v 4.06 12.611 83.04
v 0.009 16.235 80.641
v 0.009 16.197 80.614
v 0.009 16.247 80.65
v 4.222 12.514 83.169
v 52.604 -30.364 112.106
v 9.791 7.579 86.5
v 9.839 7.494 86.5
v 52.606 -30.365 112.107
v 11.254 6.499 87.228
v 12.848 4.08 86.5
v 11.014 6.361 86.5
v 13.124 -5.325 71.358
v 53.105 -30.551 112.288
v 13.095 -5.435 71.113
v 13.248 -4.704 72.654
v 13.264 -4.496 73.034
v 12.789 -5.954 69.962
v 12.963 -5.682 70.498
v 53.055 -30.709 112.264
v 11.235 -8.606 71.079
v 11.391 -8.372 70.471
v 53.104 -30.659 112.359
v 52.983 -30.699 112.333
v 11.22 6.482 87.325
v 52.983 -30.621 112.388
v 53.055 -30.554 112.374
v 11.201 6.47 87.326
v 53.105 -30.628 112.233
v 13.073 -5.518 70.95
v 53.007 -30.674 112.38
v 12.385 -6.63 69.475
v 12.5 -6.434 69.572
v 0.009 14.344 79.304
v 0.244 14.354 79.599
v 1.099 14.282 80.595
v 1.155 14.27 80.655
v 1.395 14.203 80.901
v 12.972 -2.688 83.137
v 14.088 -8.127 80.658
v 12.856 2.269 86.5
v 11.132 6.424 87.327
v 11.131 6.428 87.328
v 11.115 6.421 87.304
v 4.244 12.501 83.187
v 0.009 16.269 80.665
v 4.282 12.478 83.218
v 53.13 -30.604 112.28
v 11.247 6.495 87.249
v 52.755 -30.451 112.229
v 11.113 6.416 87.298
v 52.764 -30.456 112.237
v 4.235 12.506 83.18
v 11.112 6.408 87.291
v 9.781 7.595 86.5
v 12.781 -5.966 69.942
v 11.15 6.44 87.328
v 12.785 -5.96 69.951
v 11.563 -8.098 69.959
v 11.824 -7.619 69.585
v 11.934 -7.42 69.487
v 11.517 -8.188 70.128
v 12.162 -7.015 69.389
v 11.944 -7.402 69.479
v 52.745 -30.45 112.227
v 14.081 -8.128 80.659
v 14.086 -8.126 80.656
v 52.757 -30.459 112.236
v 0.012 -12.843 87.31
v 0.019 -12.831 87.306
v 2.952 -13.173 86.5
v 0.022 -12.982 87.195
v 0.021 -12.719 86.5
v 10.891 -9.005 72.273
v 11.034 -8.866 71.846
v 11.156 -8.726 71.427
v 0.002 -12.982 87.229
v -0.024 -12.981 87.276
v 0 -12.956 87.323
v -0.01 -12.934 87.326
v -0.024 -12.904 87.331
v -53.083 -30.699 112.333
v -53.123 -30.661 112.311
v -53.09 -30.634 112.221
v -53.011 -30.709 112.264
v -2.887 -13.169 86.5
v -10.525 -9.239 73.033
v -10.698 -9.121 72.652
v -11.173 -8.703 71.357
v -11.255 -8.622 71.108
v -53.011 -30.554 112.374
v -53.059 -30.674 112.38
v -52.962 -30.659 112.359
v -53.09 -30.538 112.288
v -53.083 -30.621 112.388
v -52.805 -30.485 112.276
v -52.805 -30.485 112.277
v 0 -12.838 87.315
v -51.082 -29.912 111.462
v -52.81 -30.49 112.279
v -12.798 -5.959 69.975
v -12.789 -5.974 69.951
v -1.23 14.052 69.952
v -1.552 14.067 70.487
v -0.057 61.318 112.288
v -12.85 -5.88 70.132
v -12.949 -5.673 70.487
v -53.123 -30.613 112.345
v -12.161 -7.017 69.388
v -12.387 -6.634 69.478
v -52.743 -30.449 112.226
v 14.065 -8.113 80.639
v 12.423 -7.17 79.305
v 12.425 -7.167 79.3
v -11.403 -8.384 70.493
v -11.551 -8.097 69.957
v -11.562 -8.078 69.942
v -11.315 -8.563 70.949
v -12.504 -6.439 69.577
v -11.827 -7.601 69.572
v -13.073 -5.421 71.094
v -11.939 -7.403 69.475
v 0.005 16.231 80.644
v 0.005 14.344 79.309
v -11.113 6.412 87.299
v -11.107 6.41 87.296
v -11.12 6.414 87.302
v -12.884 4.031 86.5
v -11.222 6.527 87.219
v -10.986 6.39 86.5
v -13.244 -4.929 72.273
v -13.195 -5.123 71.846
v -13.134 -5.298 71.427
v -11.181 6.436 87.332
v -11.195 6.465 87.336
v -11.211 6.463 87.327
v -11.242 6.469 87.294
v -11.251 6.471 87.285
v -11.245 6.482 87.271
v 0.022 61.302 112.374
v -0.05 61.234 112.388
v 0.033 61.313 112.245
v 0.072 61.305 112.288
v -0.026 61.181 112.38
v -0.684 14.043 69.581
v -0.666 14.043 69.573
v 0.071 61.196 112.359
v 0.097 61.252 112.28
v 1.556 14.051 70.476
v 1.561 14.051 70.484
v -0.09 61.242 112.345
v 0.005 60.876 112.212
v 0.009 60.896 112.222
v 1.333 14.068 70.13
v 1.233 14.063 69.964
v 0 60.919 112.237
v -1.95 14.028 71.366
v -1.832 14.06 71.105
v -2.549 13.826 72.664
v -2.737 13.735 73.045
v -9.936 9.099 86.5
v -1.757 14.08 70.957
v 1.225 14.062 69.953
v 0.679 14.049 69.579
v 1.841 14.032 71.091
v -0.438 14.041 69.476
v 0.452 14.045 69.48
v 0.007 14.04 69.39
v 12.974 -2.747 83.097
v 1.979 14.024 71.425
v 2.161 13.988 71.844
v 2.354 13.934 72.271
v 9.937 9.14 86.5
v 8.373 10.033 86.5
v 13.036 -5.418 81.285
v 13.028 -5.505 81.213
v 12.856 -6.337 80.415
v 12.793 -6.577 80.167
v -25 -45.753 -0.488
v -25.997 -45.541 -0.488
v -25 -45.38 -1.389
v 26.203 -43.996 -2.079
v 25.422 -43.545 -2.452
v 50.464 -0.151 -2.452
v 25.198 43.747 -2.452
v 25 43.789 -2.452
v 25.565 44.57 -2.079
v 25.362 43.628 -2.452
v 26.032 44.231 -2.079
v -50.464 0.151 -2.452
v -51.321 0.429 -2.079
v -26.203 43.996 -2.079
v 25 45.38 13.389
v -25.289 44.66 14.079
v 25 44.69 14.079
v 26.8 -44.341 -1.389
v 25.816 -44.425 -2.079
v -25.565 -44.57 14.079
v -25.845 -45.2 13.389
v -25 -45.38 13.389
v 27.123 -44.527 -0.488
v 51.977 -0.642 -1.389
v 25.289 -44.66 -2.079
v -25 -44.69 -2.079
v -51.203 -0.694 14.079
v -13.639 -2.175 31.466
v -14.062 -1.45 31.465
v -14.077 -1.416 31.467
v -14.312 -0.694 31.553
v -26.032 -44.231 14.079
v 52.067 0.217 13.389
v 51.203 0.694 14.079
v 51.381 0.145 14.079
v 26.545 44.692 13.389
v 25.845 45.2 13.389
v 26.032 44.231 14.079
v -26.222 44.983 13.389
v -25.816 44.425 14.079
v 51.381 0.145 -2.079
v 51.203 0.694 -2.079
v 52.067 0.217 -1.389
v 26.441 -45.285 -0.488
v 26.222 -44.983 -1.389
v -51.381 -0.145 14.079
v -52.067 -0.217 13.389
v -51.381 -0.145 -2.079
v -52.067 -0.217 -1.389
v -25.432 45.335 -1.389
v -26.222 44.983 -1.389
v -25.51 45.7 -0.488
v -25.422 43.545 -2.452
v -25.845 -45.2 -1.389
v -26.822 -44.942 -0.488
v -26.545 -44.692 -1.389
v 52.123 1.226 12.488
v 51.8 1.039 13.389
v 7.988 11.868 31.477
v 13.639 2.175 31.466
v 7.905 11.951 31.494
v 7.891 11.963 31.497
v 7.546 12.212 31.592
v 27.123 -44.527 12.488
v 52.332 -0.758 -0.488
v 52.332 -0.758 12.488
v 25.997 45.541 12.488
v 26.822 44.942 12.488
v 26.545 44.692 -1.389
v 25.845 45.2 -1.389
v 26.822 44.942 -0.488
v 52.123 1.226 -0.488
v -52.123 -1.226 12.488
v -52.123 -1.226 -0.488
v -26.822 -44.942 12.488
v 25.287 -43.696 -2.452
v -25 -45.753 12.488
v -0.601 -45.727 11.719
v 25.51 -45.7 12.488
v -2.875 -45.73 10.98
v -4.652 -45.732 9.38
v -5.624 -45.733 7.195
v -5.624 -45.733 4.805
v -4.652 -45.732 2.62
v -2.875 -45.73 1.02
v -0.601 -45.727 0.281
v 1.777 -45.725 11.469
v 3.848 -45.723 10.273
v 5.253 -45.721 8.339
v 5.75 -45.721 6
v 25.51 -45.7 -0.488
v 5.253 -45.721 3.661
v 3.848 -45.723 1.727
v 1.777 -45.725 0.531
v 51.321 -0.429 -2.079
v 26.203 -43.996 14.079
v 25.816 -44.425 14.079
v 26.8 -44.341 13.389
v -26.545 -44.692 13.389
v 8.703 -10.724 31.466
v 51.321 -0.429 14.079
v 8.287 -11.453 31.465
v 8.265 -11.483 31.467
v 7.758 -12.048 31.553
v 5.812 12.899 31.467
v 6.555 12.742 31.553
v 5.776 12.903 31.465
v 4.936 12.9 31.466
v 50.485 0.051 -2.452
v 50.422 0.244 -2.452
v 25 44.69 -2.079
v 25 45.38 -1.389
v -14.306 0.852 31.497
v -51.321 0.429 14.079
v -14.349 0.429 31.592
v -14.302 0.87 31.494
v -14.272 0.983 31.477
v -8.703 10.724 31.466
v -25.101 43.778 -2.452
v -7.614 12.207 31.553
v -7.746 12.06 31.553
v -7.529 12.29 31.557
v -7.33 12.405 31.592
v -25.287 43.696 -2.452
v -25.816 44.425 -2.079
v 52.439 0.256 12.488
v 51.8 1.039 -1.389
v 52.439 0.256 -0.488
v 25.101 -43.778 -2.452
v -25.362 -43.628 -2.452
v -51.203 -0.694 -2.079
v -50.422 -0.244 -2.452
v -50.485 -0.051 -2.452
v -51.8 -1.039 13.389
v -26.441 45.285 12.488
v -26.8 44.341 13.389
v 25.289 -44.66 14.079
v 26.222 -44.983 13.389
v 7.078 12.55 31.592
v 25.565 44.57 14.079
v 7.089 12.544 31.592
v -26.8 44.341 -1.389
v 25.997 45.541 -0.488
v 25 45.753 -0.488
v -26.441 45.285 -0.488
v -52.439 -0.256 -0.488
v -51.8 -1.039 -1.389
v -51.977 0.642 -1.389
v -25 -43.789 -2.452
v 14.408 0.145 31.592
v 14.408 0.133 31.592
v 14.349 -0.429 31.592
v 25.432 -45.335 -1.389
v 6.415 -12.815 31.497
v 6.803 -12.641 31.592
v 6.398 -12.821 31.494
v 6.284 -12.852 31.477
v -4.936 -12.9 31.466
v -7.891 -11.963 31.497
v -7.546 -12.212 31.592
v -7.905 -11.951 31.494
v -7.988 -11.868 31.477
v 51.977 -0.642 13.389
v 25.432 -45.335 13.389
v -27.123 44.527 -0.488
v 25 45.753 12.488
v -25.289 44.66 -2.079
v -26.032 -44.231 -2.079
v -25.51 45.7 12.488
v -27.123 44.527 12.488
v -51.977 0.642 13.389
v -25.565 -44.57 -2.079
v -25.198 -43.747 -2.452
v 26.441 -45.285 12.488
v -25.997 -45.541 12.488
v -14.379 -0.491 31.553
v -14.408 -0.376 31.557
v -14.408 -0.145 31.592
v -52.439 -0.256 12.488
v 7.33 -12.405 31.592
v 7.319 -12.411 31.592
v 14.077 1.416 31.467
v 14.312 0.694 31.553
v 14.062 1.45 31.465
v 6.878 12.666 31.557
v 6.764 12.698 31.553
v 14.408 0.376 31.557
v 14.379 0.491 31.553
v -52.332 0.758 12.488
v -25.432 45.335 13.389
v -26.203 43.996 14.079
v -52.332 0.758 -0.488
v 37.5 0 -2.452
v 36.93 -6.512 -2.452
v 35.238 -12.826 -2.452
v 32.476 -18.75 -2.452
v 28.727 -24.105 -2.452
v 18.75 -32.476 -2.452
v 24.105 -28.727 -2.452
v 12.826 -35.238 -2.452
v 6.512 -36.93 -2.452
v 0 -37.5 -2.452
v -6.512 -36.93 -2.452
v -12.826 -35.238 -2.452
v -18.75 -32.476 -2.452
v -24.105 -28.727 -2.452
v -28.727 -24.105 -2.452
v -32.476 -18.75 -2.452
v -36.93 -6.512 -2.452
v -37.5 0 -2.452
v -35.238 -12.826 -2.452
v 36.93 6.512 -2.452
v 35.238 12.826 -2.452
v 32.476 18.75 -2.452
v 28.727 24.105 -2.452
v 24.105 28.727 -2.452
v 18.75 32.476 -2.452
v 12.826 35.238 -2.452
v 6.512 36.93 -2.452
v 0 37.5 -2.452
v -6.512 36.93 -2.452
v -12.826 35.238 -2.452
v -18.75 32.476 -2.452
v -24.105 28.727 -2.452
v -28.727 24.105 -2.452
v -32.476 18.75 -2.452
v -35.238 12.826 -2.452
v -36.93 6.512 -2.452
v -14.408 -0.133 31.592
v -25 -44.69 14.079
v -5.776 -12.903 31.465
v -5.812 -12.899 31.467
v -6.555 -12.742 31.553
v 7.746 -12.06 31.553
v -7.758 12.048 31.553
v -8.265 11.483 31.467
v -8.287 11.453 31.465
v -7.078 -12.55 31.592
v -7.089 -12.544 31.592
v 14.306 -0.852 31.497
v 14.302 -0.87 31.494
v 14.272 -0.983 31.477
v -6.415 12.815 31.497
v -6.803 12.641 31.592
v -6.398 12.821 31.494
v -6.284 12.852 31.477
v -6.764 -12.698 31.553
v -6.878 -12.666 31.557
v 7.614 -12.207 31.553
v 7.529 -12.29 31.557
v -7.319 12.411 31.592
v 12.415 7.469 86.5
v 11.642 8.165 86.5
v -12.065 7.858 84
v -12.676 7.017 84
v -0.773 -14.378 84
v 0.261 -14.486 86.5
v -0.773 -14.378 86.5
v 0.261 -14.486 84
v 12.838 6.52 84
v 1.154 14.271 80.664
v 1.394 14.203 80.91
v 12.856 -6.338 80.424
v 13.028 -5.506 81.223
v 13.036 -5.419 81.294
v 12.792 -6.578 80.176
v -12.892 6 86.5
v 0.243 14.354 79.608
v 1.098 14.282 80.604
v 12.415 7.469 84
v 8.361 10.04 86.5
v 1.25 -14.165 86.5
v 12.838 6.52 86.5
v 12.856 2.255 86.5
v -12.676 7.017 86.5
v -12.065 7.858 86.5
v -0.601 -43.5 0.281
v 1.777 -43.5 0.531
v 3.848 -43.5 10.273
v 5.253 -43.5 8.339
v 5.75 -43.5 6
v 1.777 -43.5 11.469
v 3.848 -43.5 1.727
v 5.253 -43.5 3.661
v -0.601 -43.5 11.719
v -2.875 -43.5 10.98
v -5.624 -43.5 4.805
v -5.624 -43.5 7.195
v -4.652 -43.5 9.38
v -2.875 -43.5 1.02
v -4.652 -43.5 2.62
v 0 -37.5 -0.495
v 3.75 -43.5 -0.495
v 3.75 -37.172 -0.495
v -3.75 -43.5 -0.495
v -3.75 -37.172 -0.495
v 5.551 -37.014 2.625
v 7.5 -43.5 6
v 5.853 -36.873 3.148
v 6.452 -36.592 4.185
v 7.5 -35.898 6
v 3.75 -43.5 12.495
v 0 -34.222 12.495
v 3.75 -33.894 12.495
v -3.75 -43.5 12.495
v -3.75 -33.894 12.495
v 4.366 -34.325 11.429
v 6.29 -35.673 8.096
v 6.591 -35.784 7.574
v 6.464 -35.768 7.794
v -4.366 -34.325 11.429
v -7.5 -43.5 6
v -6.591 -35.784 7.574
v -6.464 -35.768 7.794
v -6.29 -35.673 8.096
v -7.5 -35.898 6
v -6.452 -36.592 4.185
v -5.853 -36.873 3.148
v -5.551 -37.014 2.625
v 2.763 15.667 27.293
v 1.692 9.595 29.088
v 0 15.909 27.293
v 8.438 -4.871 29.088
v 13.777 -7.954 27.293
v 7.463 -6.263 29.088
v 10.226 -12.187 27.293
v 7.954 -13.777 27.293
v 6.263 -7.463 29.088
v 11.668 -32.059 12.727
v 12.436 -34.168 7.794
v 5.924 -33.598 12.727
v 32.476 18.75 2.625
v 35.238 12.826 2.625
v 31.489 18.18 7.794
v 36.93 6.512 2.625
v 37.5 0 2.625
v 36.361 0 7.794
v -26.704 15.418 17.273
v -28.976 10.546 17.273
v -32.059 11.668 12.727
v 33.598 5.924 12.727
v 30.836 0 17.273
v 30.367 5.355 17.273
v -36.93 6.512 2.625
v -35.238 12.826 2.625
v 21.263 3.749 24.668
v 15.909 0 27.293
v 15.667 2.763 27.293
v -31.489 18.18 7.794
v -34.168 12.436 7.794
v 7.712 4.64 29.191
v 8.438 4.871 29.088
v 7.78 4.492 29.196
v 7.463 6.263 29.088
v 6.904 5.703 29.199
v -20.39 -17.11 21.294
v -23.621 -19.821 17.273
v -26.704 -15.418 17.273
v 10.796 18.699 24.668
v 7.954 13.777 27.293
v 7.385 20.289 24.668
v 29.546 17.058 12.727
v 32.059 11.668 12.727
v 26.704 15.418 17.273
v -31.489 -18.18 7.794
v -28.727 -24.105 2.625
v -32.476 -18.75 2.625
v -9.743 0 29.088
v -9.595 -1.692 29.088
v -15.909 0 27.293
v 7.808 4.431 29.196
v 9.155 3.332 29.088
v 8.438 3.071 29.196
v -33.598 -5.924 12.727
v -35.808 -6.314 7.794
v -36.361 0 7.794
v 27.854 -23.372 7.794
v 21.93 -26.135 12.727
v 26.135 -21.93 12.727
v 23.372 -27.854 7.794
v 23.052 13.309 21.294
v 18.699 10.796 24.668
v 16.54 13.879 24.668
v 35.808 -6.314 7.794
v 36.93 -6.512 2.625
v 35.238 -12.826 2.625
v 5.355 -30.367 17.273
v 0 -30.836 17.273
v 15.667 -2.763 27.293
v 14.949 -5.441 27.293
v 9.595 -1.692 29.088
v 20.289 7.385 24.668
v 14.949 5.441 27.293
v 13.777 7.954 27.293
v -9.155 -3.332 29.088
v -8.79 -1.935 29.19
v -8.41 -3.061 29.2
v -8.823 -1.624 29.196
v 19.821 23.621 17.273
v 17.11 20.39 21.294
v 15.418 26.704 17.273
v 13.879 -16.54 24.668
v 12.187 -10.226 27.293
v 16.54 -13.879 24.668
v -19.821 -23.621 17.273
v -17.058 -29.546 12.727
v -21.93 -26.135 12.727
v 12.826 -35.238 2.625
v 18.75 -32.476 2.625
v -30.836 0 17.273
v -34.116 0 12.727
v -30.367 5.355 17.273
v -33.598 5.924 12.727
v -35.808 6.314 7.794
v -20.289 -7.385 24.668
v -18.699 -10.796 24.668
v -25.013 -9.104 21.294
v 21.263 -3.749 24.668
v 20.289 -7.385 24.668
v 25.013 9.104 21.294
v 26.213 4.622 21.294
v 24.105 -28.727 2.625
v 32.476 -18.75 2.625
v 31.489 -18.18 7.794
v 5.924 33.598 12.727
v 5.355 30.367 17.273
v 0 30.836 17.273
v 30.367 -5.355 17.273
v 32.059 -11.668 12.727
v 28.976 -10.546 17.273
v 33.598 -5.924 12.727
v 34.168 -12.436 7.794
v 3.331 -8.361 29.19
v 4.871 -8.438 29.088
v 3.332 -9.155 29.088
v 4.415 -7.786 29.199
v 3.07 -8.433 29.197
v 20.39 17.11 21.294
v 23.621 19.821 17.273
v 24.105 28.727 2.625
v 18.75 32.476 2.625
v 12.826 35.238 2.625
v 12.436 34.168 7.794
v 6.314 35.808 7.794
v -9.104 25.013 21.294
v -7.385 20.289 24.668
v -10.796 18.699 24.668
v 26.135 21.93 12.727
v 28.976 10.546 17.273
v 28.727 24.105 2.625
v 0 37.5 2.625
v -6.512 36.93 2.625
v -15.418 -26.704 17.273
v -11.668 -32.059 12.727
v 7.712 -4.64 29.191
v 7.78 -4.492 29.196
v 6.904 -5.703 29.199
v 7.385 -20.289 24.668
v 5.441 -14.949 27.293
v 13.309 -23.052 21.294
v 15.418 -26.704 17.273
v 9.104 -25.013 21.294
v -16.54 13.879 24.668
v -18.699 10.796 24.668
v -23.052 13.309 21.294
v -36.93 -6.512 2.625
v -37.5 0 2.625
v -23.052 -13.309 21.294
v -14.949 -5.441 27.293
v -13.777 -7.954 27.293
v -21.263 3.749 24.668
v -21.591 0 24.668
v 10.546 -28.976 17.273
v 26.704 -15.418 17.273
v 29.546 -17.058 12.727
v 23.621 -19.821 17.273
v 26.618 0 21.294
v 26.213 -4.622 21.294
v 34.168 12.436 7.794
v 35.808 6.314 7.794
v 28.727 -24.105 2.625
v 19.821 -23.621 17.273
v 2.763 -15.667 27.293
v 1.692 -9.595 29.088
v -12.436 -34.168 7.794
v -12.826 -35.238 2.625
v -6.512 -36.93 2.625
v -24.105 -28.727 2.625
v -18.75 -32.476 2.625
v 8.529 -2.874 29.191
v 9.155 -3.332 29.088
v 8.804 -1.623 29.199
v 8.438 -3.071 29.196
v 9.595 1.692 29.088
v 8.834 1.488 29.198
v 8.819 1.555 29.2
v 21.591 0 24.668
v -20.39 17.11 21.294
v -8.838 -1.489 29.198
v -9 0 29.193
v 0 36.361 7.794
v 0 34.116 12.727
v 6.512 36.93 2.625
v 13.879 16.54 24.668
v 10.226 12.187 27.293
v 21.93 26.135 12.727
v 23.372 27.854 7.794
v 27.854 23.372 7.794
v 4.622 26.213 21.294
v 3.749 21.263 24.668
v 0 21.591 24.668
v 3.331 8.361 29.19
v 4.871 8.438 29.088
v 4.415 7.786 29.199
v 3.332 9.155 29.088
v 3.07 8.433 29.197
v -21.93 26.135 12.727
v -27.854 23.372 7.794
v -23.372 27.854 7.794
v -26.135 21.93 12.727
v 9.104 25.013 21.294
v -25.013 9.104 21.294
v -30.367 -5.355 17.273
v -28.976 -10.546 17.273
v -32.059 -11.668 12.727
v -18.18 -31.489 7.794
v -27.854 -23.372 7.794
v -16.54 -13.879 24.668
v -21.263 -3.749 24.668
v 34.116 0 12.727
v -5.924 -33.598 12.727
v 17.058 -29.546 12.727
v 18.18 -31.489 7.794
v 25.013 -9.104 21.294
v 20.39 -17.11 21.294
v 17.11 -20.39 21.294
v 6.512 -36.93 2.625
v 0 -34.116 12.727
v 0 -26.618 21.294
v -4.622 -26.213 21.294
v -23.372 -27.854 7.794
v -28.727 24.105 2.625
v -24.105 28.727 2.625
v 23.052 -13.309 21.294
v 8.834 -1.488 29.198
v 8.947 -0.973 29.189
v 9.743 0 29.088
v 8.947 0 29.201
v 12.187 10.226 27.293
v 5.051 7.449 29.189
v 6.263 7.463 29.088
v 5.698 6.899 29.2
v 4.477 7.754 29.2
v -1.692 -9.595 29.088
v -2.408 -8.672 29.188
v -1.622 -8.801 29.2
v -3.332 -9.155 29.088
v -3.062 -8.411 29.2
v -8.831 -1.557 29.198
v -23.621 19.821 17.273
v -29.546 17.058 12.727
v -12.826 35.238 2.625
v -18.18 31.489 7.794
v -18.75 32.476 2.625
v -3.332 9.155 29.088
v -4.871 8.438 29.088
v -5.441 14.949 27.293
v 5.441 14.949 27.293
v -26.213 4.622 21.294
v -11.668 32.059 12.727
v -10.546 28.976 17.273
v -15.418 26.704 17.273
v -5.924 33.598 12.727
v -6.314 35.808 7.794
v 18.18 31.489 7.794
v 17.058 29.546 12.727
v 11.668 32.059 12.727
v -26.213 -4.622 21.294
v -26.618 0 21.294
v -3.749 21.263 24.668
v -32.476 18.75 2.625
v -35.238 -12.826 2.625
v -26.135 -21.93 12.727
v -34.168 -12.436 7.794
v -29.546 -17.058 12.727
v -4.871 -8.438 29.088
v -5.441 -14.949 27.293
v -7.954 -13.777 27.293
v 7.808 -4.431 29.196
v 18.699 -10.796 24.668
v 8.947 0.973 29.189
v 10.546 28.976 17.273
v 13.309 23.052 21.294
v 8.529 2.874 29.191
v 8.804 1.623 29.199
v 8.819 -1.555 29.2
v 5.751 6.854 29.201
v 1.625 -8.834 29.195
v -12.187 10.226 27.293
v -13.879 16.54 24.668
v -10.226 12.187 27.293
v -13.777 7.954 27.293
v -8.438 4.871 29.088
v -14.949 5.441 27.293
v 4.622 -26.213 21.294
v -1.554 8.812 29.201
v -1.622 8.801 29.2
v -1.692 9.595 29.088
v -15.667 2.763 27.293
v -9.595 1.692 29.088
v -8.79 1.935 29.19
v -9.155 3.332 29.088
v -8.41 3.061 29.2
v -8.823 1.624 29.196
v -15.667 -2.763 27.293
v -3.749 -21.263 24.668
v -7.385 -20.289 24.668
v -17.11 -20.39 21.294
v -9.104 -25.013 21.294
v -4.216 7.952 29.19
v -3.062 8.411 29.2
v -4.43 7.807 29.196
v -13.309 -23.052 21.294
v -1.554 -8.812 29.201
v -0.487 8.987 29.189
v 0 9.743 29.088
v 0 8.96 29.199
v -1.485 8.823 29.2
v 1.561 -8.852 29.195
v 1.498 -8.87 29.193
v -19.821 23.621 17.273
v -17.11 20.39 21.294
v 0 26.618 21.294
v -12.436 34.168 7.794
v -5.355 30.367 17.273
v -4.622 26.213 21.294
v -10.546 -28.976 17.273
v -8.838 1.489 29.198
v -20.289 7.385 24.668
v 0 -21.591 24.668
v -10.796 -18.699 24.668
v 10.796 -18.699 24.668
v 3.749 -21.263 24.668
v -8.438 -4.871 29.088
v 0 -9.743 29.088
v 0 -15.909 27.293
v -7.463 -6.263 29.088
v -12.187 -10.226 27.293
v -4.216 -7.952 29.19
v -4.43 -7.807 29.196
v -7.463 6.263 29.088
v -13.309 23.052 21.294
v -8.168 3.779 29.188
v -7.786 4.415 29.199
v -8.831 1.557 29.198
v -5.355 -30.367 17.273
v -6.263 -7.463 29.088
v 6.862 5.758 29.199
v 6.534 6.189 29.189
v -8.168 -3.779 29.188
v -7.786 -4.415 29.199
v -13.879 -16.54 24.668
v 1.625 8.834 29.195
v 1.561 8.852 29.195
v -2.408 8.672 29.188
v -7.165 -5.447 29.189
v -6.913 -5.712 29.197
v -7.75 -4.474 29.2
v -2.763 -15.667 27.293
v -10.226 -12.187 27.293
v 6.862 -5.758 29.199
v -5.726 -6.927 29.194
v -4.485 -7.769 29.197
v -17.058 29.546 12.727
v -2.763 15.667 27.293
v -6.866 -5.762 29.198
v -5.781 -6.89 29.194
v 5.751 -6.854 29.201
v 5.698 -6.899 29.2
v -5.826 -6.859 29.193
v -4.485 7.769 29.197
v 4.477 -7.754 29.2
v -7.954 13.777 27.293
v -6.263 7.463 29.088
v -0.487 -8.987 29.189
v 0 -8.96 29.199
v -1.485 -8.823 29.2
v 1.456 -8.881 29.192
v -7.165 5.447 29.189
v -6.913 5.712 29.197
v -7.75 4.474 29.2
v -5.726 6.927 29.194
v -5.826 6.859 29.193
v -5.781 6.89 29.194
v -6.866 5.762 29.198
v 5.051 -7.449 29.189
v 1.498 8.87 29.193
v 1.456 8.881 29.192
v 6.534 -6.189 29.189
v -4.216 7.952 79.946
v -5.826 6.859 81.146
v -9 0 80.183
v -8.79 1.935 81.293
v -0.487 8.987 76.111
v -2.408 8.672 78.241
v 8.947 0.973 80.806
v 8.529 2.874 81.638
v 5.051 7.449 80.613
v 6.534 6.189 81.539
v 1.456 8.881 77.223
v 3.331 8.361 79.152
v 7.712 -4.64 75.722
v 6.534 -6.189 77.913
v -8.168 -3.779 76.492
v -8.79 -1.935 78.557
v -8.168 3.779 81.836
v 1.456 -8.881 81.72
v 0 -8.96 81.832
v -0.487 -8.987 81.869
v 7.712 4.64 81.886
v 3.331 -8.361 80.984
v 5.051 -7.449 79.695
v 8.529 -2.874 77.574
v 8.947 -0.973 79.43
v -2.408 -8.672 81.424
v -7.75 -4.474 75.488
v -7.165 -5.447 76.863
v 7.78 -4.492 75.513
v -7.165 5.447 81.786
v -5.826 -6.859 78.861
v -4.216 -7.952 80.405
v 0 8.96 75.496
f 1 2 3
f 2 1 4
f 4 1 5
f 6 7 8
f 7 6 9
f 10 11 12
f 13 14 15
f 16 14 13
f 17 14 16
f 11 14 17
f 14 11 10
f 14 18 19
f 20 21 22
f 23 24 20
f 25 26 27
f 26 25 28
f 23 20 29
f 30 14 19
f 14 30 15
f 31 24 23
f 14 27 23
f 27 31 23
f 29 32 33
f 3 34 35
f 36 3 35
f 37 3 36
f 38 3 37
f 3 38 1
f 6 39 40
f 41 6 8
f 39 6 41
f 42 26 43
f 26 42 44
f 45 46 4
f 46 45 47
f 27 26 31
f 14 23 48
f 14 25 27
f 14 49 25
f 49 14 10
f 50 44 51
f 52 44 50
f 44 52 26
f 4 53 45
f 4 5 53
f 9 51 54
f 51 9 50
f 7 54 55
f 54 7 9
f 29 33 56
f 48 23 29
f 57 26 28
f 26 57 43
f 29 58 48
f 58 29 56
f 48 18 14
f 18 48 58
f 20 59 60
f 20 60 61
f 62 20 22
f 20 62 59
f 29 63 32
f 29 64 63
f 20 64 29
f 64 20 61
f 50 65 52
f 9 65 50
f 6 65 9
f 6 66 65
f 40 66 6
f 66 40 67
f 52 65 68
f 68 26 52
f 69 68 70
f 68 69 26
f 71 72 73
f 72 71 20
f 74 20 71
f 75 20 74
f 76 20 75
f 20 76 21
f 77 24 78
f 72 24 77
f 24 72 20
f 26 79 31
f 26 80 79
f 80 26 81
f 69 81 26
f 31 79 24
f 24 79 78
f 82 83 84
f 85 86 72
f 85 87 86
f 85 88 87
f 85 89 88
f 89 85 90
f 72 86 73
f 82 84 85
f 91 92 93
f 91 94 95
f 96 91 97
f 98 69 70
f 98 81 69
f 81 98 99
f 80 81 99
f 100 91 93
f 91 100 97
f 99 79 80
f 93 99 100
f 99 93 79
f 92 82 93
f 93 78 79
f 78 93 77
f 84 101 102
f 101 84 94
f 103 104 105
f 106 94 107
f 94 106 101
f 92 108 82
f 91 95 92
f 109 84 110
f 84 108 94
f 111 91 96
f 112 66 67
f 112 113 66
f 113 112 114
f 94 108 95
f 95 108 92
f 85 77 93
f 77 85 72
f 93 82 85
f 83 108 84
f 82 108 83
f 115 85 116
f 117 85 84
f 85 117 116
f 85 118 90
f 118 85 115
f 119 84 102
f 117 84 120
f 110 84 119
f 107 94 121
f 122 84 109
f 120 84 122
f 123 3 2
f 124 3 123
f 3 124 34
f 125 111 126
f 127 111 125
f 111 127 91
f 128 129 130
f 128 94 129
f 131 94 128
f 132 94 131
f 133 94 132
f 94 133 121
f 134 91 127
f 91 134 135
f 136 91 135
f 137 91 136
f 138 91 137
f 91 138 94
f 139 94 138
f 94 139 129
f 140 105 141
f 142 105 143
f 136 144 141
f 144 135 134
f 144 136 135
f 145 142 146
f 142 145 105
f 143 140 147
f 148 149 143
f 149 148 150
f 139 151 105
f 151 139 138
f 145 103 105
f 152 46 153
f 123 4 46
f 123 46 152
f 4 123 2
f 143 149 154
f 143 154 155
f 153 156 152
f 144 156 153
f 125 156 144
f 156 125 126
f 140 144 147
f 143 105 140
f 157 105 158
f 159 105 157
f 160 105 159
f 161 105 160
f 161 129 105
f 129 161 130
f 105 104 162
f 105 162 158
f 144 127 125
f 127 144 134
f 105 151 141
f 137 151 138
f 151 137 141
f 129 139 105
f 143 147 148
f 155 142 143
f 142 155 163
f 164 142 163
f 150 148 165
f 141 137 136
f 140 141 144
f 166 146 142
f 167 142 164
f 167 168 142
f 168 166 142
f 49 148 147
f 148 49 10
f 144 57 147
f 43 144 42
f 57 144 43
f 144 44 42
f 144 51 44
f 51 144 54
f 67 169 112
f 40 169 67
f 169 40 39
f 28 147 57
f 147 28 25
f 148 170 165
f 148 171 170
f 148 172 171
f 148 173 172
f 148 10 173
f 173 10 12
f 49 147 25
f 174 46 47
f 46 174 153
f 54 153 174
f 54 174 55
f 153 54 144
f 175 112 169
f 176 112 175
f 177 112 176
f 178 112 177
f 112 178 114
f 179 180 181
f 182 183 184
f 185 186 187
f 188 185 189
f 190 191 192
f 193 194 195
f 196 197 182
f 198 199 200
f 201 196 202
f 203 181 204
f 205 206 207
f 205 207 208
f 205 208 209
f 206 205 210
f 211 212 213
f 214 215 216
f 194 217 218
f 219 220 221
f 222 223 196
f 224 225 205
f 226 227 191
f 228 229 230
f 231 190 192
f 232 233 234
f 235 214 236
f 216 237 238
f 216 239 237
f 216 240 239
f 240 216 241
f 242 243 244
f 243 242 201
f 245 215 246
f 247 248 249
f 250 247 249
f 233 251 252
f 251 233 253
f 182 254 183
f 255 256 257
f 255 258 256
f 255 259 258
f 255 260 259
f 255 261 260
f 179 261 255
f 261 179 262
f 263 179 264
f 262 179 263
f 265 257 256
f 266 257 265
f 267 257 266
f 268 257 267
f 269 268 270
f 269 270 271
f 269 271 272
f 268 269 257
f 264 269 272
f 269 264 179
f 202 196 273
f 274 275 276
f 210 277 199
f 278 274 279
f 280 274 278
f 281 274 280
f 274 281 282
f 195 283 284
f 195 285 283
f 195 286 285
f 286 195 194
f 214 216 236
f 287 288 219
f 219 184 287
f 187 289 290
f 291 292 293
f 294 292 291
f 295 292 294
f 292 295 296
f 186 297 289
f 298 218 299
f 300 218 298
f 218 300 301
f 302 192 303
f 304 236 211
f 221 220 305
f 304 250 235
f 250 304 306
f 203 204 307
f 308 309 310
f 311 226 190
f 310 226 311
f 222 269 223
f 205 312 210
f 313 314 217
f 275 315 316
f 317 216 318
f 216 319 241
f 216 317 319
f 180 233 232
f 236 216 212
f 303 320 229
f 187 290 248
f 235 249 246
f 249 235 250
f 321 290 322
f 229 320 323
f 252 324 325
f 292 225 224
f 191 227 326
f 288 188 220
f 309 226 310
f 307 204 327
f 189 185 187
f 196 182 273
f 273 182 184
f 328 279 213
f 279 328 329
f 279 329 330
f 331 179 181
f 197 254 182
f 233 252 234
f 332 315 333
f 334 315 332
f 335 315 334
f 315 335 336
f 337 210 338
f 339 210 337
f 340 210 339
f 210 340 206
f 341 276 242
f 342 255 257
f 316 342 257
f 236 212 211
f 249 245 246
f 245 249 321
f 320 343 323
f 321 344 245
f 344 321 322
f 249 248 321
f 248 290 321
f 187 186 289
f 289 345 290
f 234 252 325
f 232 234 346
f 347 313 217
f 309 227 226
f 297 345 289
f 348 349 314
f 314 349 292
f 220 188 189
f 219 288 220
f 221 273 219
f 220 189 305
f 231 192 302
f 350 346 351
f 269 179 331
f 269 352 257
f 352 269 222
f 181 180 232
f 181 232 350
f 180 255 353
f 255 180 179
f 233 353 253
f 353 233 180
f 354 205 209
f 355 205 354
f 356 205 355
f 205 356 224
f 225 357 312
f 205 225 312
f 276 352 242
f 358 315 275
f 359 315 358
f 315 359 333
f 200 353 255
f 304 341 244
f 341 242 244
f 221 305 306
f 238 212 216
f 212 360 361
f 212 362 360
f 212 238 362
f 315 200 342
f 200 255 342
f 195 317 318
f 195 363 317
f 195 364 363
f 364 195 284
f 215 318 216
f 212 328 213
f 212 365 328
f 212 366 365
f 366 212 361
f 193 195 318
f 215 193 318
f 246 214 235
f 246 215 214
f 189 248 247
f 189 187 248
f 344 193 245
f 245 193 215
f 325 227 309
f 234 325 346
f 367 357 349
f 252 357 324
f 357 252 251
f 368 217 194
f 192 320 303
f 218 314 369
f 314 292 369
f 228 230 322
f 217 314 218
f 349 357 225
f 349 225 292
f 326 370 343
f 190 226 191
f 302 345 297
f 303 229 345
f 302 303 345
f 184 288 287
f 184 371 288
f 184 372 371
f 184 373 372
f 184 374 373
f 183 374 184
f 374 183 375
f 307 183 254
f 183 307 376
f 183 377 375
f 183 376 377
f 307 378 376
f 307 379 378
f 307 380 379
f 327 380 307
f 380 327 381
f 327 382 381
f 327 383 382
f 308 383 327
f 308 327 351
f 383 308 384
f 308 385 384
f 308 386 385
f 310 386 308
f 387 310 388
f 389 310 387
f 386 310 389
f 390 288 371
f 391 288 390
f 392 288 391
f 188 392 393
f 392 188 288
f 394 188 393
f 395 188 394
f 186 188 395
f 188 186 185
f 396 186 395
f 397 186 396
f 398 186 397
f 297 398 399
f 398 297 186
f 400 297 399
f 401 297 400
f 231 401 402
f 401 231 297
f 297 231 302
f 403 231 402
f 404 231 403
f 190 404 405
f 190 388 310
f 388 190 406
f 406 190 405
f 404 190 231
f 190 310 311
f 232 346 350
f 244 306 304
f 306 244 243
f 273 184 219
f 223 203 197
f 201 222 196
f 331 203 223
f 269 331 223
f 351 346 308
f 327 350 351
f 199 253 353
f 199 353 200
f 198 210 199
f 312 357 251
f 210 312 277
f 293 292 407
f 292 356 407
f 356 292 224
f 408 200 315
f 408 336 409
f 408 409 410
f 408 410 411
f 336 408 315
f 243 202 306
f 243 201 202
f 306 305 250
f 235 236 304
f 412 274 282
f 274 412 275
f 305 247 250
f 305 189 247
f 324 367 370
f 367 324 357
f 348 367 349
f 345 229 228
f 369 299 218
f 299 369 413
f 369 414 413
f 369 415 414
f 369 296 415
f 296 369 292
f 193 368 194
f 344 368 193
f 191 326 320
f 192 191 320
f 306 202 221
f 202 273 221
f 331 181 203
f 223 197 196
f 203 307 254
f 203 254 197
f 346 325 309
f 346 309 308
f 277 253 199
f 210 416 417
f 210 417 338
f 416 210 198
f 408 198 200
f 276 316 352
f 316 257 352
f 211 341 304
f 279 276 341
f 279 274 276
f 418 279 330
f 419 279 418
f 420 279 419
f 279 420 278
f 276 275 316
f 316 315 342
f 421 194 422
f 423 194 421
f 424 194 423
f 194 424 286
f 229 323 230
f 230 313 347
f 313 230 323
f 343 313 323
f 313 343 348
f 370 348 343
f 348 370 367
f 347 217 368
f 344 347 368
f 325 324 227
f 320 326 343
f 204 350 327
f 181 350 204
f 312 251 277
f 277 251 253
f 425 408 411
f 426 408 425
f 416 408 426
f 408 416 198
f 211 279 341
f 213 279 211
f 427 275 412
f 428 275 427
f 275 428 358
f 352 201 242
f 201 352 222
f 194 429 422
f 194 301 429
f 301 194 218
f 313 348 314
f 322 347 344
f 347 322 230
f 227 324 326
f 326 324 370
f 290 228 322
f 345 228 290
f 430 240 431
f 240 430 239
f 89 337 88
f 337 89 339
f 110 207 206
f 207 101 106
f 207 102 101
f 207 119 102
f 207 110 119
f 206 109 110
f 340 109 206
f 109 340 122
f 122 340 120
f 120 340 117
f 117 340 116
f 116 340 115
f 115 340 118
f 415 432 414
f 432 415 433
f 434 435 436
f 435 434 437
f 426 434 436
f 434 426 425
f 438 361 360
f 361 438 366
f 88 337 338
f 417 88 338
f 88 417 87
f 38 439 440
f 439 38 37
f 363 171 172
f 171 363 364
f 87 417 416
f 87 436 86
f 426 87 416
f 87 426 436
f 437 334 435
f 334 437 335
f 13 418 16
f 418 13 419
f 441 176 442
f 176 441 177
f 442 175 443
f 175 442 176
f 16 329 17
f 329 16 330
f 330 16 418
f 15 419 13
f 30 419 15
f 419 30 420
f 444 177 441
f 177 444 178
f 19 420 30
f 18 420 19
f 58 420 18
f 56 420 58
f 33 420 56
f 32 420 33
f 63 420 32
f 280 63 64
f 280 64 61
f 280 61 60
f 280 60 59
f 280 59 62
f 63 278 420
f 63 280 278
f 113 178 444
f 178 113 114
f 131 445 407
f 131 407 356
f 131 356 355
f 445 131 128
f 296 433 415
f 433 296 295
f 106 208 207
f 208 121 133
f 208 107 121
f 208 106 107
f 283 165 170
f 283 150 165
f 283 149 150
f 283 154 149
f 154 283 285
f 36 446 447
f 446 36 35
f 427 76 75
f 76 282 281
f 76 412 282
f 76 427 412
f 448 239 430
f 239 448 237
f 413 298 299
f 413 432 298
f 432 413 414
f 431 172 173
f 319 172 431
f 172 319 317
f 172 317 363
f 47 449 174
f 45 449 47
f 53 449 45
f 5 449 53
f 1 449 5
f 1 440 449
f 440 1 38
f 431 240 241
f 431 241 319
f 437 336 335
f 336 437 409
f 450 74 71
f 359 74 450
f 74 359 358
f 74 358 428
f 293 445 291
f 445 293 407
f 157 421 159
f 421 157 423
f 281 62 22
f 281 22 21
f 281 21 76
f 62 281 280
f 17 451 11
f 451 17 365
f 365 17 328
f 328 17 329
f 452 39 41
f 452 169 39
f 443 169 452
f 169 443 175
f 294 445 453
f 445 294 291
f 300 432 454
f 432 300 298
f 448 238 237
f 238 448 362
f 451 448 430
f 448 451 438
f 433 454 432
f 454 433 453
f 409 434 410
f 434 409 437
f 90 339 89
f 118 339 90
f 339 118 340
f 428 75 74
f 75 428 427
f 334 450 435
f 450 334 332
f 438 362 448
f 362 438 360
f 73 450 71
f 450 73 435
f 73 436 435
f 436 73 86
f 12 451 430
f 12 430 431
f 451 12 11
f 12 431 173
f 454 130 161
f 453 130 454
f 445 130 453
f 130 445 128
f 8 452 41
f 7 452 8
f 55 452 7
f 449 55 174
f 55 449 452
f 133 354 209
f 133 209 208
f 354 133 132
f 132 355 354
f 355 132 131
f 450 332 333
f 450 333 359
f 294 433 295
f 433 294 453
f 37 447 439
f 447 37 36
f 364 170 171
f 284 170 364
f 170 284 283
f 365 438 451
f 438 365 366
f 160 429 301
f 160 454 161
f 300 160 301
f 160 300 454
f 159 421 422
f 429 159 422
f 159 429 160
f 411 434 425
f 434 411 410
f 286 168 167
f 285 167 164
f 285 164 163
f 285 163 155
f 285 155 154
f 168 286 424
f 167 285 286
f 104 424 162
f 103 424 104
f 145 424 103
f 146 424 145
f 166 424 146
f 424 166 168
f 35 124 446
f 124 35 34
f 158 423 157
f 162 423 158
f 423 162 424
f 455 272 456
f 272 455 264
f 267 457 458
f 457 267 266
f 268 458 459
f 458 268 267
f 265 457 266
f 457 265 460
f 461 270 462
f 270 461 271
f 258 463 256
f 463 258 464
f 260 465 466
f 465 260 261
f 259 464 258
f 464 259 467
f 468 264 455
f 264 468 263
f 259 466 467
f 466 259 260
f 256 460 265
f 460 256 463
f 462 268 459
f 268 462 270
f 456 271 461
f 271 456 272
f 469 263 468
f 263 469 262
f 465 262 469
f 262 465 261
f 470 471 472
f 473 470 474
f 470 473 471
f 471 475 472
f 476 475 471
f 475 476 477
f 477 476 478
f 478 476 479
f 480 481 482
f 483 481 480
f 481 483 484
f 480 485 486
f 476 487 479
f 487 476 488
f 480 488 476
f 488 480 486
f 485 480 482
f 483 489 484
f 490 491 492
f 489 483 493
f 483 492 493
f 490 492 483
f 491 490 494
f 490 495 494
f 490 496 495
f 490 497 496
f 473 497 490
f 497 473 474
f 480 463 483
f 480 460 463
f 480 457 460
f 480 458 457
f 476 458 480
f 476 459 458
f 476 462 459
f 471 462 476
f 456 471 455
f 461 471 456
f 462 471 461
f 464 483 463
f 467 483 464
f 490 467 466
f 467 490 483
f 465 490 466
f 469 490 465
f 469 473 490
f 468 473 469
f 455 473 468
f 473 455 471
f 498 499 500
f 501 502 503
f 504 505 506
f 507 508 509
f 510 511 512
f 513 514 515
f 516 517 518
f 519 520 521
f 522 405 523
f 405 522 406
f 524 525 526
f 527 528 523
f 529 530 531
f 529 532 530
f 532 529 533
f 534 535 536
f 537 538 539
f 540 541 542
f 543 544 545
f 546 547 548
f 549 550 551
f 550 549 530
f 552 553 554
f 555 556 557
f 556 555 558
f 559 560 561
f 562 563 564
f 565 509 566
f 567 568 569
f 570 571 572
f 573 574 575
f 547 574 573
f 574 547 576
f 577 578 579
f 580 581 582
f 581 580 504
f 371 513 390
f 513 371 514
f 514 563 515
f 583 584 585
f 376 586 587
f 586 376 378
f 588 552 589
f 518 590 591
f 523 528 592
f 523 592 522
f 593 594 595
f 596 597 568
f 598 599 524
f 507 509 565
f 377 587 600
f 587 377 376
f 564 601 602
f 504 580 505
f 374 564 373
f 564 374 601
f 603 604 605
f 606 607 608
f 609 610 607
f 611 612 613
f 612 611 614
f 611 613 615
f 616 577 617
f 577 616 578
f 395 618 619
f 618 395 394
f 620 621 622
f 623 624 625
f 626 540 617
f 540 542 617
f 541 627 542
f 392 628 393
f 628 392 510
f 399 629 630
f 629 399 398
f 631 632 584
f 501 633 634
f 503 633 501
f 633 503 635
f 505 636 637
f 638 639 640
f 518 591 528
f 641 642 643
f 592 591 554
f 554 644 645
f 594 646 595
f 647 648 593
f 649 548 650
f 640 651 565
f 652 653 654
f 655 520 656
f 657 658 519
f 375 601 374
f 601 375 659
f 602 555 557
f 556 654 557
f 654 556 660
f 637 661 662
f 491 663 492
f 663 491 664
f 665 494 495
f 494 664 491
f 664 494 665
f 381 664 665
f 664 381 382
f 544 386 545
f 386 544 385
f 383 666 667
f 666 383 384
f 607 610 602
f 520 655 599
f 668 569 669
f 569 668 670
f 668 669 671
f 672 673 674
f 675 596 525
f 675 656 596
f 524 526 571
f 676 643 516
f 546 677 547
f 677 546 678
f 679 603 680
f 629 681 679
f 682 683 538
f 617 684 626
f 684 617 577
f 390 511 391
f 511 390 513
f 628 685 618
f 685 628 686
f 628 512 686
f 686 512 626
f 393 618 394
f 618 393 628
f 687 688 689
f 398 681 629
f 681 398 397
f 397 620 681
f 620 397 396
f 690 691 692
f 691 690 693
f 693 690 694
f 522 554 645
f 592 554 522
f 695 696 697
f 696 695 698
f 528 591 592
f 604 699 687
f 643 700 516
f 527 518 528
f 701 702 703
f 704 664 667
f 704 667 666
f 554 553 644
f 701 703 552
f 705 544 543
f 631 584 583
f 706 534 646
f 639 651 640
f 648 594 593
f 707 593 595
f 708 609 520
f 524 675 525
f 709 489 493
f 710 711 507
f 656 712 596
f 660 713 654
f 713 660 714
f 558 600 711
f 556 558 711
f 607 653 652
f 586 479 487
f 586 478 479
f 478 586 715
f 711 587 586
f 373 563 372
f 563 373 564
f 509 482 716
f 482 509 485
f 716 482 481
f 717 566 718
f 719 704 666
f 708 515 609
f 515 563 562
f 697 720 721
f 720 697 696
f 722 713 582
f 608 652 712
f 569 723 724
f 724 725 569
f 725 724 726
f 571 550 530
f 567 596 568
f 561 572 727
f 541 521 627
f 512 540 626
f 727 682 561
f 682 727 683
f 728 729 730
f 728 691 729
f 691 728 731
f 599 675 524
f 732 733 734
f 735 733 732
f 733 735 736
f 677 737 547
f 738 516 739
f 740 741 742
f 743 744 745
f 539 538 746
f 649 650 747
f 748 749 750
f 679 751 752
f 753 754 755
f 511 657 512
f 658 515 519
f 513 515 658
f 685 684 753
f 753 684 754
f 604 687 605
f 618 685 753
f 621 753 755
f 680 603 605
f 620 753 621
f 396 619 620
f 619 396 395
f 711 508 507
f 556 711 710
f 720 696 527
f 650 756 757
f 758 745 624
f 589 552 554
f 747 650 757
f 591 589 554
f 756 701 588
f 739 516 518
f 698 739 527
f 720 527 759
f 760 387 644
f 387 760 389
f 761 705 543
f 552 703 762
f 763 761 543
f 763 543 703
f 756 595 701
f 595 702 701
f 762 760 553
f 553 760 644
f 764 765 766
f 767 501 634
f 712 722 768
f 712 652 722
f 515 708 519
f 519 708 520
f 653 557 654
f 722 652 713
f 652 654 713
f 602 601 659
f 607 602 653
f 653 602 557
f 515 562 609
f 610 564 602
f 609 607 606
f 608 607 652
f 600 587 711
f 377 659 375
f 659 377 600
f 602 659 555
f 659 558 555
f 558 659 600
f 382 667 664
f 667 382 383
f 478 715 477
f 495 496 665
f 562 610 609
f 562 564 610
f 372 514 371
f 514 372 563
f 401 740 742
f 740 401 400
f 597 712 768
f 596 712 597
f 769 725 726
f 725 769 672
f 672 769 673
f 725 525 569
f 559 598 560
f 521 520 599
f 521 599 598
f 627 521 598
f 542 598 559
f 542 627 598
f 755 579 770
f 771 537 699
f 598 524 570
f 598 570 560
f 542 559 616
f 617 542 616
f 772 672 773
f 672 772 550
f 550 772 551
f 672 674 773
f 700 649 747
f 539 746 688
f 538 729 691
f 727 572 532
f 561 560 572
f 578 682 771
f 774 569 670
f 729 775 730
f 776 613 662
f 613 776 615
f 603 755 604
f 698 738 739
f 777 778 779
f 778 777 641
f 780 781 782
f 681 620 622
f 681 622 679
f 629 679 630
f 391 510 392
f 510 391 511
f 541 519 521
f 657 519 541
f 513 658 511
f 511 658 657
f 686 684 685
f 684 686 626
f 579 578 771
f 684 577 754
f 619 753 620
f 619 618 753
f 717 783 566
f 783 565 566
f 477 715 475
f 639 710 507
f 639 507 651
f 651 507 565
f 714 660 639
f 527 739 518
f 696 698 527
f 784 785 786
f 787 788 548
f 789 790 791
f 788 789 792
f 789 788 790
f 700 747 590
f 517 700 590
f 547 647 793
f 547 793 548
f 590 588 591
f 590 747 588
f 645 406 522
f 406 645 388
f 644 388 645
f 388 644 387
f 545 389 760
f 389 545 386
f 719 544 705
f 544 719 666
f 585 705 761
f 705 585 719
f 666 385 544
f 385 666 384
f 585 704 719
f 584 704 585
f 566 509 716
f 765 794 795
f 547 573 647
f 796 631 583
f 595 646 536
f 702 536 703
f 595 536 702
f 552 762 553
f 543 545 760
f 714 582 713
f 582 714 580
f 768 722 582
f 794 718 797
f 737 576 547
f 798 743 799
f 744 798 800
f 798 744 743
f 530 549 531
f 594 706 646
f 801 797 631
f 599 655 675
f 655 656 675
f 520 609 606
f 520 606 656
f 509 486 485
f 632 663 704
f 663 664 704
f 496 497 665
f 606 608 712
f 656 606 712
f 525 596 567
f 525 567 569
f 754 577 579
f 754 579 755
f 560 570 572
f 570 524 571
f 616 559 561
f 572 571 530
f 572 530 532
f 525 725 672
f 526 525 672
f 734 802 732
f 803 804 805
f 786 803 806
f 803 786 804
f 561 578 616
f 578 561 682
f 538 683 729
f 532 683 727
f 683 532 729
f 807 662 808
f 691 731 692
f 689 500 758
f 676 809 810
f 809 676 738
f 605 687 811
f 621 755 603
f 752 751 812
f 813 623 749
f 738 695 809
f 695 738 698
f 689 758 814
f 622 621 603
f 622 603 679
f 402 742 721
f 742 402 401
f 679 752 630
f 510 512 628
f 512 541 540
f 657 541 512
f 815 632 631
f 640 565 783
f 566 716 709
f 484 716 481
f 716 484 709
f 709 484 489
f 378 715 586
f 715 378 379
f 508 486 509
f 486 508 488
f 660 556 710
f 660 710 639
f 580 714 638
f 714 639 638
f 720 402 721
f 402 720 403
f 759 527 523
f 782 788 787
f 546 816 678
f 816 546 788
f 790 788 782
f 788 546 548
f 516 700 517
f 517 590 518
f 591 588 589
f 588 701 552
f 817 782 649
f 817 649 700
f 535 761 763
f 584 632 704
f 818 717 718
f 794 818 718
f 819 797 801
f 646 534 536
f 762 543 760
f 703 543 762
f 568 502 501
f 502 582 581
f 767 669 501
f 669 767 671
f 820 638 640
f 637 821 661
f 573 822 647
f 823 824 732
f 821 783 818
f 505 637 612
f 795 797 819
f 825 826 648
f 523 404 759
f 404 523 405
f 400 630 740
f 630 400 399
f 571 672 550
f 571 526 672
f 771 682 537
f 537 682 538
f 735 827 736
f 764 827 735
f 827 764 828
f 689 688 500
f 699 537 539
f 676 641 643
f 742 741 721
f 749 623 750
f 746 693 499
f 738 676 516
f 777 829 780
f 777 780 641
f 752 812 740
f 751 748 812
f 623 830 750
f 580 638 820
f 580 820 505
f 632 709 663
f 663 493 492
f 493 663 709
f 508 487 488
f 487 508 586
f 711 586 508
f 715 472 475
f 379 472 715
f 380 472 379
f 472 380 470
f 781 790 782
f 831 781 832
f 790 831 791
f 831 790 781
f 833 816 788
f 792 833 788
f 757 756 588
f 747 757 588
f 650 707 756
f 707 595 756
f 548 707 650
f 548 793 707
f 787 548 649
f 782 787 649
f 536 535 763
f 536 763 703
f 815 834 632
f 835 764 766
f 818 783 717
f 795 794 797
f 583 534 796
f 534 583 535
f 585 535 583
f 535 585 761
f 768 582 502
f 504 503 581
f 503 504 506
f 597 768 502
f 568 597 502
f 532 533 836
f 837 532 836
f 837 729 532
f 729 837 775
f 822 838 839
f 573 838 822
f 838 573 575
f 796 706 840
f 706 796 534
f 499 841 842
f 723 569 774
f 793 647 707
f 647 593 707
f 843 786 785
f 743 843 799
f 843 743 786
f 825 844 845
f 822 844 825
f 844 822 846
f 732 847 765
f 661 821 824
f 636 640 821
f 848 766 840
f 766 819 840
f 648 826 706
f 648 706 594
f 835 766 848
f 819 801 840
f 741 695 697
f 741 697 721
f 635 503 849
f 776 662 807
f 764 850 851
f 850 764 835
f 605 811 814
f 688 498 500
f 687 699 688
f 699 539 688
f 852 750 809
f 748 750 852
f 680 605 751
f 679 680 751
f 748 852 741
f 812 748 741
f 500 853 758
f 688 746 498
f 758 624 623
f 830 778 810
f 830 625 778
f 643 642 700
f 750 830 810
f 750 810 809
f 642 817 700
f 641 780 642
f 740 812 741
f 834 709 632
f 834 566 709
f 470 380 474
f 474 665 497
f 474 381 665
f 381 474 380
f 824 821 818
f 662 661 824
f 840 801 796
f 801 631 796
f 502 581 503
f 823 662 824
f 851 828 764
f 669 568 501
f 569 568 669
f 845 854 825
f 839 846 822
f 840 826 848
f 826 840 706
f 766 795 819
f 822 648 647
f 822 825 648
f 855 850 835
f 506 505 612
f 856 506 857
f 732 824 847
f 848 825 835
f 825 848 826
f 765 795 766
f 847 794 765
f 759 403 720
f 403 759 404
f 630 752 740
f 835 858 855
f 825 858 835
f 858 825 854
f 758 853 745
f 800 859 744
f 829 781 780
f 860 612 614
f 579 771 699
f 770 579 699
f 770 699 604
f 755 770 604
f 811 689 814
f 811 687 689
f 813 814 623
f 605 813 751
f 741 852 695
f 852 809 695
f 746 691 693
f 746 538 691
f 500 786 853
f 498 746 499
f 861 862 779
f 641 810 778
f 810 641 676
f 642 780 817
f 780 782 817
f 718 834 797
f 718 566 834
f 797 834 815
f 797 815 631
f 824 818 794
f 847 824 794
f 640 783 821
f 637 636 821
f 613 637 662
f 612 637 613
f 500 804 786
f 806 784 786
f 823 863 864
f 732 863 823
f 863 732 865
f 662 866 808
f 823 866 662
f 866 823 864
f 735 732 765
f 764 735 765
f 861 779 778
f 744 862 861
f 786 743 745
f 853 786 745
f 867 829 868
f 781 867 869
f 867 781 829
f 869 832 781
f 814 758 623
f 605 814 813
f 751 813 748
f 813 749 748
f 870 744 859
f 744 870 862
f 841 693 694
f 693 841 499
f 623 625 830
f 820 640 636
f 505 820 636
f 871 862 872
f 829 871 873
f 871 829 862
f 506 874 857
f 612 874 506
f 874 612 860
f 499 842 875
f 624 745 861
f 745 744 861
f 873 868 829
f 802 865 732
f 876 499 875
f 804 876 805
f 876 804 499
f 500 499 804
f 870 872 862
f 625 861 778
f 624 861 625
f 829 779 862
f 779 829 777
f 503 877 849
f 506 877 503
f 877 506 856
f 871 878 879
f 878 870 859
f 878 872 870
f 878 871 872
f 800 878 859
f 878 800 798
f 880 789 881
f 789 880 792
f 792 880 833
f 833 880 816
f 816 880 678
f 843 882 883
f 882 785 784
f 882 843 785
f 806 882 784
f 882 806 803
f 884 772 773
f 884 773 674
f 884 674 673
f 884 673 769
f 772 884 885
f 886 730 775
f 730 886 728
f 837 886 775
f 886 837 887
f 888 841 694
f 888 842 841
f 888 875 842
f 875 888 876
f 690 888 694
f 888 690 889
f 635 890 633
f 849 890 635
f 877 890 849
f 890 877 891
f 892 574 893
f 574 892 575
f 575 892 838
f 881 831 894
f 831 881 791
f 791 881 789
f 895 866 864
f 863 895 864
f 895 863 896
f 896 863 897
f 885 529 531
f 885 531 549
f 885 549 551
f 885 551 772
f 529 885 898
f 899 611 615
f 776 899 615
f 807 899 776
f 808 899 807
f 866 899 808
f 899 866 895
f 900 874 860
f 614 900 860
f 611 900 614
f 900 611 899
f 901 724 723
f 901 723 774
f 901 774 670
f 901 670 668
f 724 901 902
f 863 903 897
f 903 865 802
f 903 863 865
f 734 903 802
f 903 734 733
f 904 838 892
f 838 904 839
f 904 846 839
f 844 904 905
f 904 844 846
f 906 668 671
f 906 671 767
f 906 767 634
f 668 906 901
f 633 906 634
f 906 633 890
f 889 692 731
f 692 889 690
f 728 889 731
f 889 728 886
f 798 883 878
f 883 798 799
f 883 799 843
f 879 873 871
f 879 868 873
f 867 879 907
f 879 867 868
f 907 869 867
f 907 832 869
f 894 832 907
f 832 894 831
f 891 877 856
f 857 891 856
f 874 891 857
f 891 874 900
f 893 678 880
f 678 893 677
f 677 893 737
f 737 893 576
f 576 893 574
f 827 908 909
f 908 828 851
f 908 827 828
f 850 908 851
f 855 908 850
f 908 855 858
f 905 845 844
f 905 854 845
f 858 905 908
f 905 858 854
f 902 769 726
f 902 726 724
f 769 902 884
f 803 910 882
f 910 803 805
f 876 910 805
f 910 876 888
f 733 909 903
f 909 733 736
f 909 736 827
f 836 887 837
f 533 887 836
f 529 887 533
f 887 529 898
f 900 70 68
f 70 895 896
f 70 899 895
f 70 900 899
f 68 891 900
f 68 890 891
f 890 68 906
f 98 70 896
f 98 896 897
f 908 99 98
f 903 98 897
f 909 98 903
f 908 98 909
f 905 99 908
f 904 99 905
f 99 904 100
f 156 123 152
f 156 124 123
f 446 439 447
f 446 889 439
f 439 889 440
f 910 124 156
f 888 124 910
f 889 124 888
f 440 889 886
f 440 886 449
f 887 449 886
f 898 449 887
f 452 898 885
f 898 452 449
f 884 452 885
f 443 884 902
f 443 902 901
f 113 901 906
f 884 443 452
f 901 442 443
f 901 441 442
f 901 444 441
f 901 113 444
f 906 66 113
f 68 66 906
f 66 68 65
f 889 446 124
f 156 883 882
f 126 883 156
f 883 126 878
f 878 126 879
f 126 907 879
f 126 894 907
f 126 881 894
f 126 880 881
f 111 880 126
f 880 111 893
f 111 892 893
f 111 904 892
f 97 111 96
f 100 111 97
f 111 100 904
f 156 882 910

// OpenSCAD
cubeHeigth = 20;
socketRadius=50;

socketCube();

module cubeCorner() {
    cornerHull(socketRadius*1.5, 0,                cubeHeigth,       0);
    cornerHull(socketRadius*1.5, 0,                0,                cubeHeigth);
    cornerHull(cubeHeigth,       0,                0,                socketRadius*1.5);
    cornerHull(0,                cubeHeigth,       0,                socketRadius*1.5);
    cornerHull(0,                socketRadius*1.5, 0,                cubeHeigth);
    cornerHull(cubeHeigth,       0,                socketRadius*1.5, 0);
}

module cornerHull(a, b, e, f) {
    hull() {
        translate([0,0,6*12-3]) rotate([45,-atan(sqrt(0.5)),0]) {
            translate([0,0,0]) sphere(0.1);
            translate([a,b,0]) sphere(0.1);
            translate([0,e,f]) sphere(0.1);
        }
        rotate([0,0,0]) translate([0,0,5*12]) sphere(d=5,$fn=15);
    }
}

module socketCube() { 
    difference() {
        union() {
            rotate([0,0,-30]) cubeCorner();
            hull() {
                for (i=[0:6]) {
                    rotate([0,0,i*60+30]) translate([0,socketRadius,0]) sphere(d=5,$fn=15);
                    rotate([0,0,i*60+30]) translate([0,socketRadius,12]) sphere(d=5,$fn=15);
                    rotate([0,0,i*60+30]) translate([0,12,2.5*12]) sphere(d=5,$fn=15);
                }
            }   
            hull() {
                for (i=[0:6]) {
                    rotate([0,0,i*60+30]) translate([0,12,2.5*12]) sphere(d=5,$fn=15);
                    rotate([0,0,i*60]) translate([0,12,7*12]) cylinder(d=5, h=2.5,$fn=15);
                }
            }  
        }
        resize([socketRadius*1.5,socketRadius*1.5,12*5]) sphere(d=1, $fn=36);
        translate([0,-socketRadius+29.5+2,6]) rotate([90,0,0]) union() { // power plug
            cylinder(d=11.5,h=30,$fn=15);
            translate([0,0,0])cylinder(d=15,h=25,$fn=6);
        }
        translate([0,0,9*12-3]) rotate([0,180,0]) cylinder(d=18,h=10*12);
        translate([0,0,6*12-2.84]) rotate([45,-atan(sqrt(0.5)),-30]) cube([socketRadius*1.5,socketRadius*1.5,socketRadius*1.5]);
    }
}
